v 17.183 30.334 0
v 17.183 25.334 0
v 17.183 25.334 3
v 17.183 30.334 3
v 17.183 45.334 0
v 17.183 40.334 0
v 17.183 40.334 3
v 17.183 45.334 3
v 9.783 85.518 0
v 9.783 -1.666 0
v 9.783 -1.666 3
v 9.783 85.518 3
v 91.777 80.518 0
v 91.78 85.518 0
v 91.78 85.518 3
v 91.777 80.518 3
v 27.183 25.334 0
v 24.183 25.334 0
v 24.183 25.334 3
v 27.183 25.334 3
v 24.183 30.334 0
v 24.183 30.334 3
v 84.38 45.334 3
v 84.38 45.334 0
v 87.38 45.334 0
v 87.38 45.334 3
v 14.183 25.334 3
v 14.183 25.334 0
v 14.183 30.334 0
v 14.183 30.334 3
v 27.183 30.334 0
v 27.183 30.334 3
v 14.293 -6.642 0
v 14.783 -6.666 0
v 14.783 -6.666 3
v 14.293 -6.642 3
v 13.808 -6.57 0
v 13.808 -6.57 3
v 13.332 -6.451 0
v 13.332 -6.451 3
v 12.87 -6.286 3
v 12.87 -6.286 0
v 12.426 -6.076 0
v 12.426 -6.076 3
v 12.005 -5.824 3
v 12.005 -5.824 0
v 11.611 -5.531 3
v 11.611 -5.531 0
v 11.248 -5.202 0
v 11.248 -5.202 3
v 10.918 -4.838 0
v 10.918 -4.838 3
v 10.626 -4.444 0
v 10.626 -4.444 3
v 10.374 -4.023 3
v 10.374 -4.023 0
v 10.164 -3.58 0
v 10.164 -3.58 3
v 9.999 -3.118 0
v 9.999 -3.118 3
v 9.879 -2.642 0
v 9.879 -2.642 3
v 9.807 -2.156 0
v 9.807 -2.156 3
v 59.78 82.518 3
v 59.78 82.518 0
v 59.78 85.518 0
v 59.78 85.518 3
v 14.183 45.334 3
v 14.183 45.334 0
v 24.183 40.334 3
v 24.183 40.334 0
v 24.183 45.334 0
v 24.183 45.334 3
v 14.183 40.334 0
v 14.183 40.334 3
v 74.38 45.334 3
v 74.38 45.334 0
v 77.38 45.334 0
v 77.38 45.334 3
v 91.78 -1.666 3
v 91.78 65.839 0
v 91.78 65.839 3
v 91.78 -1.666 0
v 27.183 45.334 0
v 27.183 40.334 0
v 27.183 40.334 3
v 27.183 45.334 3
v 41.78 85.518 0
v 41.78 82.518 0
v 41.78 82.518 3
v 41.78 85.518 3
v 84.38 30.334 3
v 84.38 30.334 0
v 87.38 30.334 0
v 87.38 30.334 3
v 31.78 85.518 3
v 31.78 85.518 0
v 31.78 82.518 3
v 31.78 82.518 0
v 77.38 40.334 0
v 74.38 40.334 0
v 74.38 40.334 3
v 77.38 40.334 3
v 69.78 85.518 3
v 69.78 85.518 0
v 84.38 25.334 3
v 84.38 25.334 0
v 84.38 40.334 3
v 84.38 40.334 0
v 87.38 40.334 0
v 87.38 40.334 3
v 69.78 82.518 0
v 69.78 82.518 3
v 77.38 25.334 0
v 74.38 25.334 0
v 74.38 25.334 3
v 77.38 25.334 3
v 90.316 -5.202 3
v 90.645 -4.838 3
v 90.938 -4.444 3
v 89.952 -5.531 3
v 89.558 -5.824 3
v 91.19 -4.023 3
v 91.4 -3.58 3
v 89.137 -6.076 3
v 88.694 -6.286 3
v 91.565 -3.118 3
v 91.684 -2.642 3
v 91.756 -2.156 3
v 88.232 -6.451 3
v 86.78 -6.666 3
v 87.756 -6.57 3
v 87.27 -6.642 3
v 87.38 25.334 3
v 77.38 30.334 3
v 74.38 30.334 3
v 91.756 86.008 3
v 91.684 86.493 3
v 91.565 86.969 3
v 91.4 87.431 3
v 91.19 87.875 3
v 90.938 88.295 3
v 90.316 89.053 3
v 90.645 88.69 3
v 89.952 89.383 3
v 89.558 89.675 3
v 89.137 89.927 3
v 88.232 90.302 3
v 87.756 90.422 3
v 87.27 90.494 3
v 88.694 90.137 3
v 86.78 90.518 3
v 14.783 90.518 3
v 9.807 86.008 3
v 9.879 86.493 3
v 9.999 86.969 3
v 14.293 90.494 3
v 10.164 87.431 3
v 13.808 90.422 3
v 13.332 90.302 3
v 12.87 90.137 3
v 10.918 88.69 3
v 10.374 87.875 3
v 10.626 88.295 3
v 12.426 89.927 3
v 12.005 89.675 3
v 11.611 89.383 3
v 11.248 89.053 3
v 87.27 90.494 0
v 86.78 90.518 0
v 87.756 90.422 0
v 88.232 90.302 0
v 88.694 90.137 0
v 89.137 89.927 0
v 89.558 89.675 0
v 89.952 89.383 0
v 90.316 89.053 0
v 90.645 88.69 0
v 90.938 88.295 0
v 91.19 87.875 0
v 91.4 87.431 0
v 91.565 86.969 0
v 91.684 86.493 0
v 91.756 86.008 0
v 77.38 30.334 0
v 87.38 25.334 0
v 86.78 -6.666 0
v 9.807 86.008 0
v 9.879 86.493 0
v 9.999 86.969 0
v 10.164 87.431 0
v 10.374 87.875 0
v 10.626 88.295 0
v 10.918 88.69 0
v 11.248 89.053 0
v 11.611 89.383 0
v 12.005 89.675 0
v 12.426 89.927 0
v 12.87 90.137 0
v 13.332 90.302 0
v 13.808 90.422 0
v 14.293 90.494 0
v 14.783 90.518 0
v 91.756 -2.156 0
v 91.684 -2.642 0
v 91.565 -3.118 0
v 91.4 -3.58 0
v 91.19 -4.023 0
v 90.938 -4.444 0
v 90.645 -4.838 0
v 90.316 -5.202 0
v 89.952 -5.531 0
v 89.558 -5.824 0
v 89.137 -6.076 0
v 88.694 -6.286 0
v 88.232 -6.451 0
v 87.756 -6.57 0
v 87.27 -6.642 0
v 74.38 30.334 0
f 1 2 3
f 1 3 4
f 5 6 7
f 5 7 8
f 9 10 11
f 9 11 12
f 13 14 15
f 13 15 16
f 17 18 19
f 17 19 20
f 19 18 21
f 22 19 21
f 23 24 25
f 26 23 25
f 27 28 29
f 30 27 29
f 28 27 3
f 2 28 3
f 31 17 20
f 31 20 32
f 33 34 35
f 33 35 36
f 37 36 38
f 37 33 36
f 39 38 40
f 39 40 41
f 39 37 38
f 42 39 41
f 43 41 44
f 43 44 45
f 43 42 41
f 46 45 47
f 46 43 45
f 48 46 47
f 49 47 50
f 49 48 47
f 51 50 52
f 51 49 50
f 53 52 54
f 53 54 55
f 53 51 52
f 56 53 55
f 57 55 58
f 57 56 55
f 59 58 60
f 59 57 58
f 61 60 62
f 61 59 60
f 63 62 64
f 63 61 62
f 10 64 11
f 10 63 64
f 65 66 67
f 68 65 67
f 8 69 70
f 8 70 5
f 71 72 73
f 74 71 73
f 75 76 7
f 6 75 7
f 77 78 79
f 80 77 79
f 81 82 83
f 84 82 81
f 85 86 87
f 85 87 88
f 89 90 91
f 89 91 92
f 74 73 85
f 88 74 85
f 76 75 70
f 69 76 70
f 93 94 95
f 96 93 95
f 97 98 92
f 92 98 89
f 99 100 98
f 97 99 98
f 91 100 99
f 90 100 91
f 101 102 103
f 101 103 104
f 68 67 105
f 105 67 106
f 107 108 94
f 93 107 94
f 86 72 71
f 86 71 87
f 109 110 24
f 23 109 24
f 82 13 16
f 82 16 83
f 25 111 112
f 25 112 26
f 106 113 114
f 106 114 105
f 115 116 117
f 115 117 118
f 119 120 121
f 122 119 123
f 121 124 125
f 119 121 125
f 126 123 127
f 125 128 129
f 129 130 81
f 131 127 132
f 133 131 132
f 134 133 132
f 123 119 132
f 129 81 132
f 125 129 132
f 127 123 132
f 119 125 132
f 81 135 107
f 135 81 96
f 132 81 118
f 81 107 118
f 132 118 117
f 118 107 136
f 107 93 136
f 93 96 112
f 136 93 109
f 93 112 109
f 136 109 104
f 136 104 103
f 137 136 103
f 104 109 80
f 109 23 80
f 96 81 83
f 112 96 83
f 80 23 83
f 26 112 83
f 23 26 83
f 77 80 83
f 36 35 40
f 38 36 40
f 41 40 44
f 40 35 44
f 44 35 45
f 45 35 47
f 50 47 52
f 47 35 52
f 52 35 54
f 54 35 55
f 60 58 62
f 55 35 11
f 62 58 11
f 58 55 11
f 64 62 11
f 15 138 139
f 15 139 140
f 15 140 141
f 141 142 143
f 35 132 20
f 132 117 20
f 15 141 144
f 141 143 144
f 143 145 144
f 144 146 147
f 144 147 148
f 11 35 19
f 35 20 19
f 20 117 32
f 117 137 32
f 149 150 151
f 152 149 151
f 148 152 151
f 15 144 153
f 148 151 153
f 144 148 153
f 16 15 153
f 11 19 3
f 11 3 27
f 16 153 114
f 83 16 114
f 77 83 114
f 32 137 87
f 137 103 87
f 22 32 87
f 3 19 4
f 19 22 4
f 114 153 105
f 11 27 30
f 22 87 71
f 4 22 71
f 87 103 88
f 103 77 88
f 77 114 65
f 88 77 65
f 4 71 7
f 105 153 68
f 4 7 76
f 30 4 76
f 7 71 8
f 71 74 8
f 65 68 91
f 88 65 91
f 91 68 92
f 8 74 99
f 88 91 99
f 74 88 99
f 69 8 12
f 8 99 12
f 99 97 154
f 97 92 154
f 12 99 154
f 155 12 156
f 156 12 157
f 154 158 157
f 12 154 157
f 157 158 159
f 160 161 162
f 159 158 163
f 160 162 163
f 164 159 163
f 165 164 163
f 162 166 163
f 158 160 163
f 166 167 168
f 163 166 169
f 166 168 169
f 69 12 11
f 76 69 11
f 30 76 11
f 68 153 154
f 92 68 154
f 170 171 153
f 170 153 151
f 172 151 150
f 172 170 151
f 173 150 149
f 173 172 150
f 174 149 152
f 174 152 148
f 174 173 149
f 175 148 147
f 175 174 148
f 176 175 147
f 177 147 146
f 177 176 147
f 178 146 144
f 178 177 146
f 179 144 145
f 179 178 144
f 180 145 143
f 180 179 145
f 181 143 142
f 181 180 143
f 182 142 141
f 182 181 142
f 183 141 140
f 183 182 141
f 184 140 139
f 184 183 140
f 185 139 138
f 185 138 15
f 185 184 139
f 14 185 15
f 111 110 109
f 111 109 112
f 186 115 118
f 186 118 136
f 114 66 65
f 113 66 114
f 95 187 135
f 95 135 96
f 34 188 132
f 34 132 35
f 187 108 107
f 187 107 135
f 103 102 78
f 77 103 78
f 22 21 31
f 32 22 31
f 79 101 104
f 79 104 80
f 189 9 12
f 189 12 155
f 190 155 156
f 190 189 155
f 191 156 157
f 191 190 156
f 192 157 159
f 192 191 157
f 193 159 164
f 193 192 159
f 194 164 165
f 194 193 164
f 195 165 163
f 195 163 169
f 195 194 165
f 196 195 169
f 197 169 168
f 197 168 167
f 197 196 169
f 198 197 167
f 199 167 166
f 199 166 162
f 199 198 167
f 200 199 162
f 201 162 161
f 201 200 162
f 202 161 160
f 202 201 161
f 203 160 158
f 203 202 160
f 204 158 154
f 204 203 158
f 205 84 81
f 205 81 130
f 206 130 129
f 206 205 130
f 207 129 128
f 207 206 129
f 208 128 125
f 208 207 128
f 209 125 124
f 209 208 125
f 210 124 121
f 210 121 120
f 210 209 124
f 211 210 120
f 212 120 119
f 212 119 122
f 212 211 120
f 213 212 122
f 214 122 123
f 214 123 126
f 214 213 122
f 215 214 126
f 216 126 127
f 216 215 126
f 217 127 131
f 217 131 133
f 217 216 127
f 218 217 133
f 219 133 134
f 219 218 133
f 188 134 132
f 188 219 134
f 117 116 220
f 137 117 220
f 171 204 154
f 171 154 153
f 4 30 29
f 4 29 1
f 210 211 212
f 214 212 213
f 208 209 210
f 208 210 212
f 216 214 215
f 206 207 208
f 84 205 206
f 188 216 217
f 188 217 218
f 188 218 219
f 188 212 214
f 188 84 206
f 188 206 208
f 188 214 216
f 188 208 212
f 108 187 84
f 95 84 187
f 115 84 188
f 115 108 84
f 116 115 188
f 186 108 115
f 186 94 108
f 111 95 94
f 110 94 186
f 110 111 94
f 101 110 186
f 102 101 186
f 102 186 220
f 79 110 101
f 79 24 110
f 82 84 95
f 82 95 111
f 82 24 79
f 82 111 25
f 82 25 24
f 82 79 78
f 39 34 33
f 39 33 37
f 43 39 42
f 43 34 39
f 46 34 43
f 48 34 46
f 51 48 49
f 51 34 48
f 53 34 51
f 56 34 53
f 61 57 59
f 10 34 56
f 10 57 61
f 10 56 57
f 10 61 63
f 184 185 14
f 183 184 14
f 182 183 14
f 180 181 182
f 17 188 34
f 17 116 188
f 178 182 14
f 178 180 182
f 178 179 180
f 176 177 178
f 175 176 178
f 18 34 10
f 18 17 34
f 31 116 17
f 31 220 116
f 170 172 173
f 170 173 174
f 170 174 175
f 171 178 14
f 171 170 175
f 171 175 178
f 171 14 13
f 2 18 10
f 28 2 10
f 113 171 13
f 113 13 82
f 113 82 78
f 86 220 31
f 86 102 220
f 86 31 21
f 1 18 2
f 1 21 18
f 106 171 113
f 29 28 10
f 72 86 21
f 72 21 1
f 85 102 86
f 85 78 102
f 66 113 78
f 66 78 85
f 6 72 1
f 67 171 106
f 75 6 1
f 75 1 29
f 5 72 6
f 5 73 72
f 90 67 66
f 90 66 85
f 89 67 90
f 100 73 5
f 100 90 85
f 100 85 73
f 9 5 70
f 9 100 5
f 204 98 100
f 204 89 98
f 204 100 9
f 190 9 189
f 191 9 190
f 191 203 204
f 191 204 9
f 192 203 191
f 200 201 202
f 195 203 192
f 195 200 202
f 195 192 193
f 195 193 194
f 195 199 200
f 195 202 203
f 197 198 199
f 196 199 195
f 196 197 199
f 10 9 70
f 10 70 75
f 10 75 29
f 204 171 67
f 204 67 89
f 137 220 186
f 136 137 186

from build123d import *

# Parameters (mm, degrees)
MODEL_W                 = 10
MODEL_H                 = 3
MODEL_W_2               = 3
MODEL_H_2               = 5
SALIENTE_EXTRUIR1_DEPTH = 3


with BuildPart() as part:
    # Model → Saliente-Extruir1 (new body)
    with BuildSketch(Plane.XY):
        with BuildLine():
            Line((91.780211275, 65.839195147), (91.780211275, 57.379955116))
            Line((91.780211275, 57.379955116), (91.780211275, 13.141428354))
            Line((91.780211275, 13.141428354), (91.780211275, 3.638851328))
            Line((91.780211275, 3.638851328), (91.780211275, -1.666158522))
            ThreePointArc((91.780211275, -1.666158522), (90.315745044, -5.201692177), (86.780211275, -6.666158134))
            Line((86.780211275, -6.666158134), (14.78327762, -6.666158134))
            ThreePointArc((14.78327762, -6.666158134), (11.247743714, -5.20169204), (9.78327762, -1.666158134))
            Line((9.78327762, -1.666158134), (9.78327762, 23.733841478))
            Line((9.78327762, 23.733841478), (9.78327762, 46.933841478))
            Line((9.78327762, 46.933841478), (9.78327762, 77.517630631))
            Line((9.78327762, 77.517630631), (9.78327762, 85.517630631))
            ThreePointArc((9.78327762, 85.517630631), (11.247743714, 89.053164537), (14.78327762, 90.517630631))
            Line((14.78327762, 90.517630631), (86.780211275, 90.517630631))
            ThreePointArc((86.780211275, 90.517630631), (90.315745181, 89.053164537), (91.780211275, 85.517630631))
            Line((91.780211275, 85.517630631), (91.77714493, 80.517630631))
            Line((91.77714493, 80.517630631), (91.780211275, 65.839195147))
        make_face()
        with Locations((64.780211275, 84.017630631)):
            Rectangle(MODEL_W, MODEL_H, mode=Mode.SUBTRACT)
        with Locations((36.780211275, 84.017630631)):
            Rectangle(MODEL_W, MODEL_H, mode=Mode.SUBTRACT)
        with Locations((75.880211275, 42.833841478)):
            Rectangle(MODEL_W_2, MODEL_H_2, mode=Mode.SUBTRACT)
        with Locations((75.880211275, 27.833841478)):
            Rectangle(MODEL_W_2, MODEL_H_2, mode=Mode.SUBTRACT)
        with Locations((15.68327762, 42.833841478)):
            Rectangle(MODEL_W_2, MODEL_H_2, mode=Mode.SUBTRACT)
        with Locations((15.68327762, 27.833841478)):
            Rectangle(MODEL_W_2, MODEL_H_2, mode=Mode.SUBTRACT)
        with Locations((85.880211275, 42.833841478)):
            Rectangle(MODEL_W_2, MODEL_H_2, mode=Mode.SUBTRACT)
        with Locations((85.880211275, 27.833841478)):
            Rectangle(MODEL_W_2, MODEL_H_2, mode=Mode.SUBTRACT)
        with Locations((25.68327762, 42.833841478)):
            Rectangle(MODEL_W_2, MODEL_H_2, mode=Mode.SUBTRACT)
        with Locations((25.68327762, 27.833841478)):
            Rectangle(MODEL_W_2, MODEL_H_2, mode=Mode.SUBTRACT)
    extrude(amount=SALIENTE_EXTRUIR1_DEPTH)


solid = part.part
